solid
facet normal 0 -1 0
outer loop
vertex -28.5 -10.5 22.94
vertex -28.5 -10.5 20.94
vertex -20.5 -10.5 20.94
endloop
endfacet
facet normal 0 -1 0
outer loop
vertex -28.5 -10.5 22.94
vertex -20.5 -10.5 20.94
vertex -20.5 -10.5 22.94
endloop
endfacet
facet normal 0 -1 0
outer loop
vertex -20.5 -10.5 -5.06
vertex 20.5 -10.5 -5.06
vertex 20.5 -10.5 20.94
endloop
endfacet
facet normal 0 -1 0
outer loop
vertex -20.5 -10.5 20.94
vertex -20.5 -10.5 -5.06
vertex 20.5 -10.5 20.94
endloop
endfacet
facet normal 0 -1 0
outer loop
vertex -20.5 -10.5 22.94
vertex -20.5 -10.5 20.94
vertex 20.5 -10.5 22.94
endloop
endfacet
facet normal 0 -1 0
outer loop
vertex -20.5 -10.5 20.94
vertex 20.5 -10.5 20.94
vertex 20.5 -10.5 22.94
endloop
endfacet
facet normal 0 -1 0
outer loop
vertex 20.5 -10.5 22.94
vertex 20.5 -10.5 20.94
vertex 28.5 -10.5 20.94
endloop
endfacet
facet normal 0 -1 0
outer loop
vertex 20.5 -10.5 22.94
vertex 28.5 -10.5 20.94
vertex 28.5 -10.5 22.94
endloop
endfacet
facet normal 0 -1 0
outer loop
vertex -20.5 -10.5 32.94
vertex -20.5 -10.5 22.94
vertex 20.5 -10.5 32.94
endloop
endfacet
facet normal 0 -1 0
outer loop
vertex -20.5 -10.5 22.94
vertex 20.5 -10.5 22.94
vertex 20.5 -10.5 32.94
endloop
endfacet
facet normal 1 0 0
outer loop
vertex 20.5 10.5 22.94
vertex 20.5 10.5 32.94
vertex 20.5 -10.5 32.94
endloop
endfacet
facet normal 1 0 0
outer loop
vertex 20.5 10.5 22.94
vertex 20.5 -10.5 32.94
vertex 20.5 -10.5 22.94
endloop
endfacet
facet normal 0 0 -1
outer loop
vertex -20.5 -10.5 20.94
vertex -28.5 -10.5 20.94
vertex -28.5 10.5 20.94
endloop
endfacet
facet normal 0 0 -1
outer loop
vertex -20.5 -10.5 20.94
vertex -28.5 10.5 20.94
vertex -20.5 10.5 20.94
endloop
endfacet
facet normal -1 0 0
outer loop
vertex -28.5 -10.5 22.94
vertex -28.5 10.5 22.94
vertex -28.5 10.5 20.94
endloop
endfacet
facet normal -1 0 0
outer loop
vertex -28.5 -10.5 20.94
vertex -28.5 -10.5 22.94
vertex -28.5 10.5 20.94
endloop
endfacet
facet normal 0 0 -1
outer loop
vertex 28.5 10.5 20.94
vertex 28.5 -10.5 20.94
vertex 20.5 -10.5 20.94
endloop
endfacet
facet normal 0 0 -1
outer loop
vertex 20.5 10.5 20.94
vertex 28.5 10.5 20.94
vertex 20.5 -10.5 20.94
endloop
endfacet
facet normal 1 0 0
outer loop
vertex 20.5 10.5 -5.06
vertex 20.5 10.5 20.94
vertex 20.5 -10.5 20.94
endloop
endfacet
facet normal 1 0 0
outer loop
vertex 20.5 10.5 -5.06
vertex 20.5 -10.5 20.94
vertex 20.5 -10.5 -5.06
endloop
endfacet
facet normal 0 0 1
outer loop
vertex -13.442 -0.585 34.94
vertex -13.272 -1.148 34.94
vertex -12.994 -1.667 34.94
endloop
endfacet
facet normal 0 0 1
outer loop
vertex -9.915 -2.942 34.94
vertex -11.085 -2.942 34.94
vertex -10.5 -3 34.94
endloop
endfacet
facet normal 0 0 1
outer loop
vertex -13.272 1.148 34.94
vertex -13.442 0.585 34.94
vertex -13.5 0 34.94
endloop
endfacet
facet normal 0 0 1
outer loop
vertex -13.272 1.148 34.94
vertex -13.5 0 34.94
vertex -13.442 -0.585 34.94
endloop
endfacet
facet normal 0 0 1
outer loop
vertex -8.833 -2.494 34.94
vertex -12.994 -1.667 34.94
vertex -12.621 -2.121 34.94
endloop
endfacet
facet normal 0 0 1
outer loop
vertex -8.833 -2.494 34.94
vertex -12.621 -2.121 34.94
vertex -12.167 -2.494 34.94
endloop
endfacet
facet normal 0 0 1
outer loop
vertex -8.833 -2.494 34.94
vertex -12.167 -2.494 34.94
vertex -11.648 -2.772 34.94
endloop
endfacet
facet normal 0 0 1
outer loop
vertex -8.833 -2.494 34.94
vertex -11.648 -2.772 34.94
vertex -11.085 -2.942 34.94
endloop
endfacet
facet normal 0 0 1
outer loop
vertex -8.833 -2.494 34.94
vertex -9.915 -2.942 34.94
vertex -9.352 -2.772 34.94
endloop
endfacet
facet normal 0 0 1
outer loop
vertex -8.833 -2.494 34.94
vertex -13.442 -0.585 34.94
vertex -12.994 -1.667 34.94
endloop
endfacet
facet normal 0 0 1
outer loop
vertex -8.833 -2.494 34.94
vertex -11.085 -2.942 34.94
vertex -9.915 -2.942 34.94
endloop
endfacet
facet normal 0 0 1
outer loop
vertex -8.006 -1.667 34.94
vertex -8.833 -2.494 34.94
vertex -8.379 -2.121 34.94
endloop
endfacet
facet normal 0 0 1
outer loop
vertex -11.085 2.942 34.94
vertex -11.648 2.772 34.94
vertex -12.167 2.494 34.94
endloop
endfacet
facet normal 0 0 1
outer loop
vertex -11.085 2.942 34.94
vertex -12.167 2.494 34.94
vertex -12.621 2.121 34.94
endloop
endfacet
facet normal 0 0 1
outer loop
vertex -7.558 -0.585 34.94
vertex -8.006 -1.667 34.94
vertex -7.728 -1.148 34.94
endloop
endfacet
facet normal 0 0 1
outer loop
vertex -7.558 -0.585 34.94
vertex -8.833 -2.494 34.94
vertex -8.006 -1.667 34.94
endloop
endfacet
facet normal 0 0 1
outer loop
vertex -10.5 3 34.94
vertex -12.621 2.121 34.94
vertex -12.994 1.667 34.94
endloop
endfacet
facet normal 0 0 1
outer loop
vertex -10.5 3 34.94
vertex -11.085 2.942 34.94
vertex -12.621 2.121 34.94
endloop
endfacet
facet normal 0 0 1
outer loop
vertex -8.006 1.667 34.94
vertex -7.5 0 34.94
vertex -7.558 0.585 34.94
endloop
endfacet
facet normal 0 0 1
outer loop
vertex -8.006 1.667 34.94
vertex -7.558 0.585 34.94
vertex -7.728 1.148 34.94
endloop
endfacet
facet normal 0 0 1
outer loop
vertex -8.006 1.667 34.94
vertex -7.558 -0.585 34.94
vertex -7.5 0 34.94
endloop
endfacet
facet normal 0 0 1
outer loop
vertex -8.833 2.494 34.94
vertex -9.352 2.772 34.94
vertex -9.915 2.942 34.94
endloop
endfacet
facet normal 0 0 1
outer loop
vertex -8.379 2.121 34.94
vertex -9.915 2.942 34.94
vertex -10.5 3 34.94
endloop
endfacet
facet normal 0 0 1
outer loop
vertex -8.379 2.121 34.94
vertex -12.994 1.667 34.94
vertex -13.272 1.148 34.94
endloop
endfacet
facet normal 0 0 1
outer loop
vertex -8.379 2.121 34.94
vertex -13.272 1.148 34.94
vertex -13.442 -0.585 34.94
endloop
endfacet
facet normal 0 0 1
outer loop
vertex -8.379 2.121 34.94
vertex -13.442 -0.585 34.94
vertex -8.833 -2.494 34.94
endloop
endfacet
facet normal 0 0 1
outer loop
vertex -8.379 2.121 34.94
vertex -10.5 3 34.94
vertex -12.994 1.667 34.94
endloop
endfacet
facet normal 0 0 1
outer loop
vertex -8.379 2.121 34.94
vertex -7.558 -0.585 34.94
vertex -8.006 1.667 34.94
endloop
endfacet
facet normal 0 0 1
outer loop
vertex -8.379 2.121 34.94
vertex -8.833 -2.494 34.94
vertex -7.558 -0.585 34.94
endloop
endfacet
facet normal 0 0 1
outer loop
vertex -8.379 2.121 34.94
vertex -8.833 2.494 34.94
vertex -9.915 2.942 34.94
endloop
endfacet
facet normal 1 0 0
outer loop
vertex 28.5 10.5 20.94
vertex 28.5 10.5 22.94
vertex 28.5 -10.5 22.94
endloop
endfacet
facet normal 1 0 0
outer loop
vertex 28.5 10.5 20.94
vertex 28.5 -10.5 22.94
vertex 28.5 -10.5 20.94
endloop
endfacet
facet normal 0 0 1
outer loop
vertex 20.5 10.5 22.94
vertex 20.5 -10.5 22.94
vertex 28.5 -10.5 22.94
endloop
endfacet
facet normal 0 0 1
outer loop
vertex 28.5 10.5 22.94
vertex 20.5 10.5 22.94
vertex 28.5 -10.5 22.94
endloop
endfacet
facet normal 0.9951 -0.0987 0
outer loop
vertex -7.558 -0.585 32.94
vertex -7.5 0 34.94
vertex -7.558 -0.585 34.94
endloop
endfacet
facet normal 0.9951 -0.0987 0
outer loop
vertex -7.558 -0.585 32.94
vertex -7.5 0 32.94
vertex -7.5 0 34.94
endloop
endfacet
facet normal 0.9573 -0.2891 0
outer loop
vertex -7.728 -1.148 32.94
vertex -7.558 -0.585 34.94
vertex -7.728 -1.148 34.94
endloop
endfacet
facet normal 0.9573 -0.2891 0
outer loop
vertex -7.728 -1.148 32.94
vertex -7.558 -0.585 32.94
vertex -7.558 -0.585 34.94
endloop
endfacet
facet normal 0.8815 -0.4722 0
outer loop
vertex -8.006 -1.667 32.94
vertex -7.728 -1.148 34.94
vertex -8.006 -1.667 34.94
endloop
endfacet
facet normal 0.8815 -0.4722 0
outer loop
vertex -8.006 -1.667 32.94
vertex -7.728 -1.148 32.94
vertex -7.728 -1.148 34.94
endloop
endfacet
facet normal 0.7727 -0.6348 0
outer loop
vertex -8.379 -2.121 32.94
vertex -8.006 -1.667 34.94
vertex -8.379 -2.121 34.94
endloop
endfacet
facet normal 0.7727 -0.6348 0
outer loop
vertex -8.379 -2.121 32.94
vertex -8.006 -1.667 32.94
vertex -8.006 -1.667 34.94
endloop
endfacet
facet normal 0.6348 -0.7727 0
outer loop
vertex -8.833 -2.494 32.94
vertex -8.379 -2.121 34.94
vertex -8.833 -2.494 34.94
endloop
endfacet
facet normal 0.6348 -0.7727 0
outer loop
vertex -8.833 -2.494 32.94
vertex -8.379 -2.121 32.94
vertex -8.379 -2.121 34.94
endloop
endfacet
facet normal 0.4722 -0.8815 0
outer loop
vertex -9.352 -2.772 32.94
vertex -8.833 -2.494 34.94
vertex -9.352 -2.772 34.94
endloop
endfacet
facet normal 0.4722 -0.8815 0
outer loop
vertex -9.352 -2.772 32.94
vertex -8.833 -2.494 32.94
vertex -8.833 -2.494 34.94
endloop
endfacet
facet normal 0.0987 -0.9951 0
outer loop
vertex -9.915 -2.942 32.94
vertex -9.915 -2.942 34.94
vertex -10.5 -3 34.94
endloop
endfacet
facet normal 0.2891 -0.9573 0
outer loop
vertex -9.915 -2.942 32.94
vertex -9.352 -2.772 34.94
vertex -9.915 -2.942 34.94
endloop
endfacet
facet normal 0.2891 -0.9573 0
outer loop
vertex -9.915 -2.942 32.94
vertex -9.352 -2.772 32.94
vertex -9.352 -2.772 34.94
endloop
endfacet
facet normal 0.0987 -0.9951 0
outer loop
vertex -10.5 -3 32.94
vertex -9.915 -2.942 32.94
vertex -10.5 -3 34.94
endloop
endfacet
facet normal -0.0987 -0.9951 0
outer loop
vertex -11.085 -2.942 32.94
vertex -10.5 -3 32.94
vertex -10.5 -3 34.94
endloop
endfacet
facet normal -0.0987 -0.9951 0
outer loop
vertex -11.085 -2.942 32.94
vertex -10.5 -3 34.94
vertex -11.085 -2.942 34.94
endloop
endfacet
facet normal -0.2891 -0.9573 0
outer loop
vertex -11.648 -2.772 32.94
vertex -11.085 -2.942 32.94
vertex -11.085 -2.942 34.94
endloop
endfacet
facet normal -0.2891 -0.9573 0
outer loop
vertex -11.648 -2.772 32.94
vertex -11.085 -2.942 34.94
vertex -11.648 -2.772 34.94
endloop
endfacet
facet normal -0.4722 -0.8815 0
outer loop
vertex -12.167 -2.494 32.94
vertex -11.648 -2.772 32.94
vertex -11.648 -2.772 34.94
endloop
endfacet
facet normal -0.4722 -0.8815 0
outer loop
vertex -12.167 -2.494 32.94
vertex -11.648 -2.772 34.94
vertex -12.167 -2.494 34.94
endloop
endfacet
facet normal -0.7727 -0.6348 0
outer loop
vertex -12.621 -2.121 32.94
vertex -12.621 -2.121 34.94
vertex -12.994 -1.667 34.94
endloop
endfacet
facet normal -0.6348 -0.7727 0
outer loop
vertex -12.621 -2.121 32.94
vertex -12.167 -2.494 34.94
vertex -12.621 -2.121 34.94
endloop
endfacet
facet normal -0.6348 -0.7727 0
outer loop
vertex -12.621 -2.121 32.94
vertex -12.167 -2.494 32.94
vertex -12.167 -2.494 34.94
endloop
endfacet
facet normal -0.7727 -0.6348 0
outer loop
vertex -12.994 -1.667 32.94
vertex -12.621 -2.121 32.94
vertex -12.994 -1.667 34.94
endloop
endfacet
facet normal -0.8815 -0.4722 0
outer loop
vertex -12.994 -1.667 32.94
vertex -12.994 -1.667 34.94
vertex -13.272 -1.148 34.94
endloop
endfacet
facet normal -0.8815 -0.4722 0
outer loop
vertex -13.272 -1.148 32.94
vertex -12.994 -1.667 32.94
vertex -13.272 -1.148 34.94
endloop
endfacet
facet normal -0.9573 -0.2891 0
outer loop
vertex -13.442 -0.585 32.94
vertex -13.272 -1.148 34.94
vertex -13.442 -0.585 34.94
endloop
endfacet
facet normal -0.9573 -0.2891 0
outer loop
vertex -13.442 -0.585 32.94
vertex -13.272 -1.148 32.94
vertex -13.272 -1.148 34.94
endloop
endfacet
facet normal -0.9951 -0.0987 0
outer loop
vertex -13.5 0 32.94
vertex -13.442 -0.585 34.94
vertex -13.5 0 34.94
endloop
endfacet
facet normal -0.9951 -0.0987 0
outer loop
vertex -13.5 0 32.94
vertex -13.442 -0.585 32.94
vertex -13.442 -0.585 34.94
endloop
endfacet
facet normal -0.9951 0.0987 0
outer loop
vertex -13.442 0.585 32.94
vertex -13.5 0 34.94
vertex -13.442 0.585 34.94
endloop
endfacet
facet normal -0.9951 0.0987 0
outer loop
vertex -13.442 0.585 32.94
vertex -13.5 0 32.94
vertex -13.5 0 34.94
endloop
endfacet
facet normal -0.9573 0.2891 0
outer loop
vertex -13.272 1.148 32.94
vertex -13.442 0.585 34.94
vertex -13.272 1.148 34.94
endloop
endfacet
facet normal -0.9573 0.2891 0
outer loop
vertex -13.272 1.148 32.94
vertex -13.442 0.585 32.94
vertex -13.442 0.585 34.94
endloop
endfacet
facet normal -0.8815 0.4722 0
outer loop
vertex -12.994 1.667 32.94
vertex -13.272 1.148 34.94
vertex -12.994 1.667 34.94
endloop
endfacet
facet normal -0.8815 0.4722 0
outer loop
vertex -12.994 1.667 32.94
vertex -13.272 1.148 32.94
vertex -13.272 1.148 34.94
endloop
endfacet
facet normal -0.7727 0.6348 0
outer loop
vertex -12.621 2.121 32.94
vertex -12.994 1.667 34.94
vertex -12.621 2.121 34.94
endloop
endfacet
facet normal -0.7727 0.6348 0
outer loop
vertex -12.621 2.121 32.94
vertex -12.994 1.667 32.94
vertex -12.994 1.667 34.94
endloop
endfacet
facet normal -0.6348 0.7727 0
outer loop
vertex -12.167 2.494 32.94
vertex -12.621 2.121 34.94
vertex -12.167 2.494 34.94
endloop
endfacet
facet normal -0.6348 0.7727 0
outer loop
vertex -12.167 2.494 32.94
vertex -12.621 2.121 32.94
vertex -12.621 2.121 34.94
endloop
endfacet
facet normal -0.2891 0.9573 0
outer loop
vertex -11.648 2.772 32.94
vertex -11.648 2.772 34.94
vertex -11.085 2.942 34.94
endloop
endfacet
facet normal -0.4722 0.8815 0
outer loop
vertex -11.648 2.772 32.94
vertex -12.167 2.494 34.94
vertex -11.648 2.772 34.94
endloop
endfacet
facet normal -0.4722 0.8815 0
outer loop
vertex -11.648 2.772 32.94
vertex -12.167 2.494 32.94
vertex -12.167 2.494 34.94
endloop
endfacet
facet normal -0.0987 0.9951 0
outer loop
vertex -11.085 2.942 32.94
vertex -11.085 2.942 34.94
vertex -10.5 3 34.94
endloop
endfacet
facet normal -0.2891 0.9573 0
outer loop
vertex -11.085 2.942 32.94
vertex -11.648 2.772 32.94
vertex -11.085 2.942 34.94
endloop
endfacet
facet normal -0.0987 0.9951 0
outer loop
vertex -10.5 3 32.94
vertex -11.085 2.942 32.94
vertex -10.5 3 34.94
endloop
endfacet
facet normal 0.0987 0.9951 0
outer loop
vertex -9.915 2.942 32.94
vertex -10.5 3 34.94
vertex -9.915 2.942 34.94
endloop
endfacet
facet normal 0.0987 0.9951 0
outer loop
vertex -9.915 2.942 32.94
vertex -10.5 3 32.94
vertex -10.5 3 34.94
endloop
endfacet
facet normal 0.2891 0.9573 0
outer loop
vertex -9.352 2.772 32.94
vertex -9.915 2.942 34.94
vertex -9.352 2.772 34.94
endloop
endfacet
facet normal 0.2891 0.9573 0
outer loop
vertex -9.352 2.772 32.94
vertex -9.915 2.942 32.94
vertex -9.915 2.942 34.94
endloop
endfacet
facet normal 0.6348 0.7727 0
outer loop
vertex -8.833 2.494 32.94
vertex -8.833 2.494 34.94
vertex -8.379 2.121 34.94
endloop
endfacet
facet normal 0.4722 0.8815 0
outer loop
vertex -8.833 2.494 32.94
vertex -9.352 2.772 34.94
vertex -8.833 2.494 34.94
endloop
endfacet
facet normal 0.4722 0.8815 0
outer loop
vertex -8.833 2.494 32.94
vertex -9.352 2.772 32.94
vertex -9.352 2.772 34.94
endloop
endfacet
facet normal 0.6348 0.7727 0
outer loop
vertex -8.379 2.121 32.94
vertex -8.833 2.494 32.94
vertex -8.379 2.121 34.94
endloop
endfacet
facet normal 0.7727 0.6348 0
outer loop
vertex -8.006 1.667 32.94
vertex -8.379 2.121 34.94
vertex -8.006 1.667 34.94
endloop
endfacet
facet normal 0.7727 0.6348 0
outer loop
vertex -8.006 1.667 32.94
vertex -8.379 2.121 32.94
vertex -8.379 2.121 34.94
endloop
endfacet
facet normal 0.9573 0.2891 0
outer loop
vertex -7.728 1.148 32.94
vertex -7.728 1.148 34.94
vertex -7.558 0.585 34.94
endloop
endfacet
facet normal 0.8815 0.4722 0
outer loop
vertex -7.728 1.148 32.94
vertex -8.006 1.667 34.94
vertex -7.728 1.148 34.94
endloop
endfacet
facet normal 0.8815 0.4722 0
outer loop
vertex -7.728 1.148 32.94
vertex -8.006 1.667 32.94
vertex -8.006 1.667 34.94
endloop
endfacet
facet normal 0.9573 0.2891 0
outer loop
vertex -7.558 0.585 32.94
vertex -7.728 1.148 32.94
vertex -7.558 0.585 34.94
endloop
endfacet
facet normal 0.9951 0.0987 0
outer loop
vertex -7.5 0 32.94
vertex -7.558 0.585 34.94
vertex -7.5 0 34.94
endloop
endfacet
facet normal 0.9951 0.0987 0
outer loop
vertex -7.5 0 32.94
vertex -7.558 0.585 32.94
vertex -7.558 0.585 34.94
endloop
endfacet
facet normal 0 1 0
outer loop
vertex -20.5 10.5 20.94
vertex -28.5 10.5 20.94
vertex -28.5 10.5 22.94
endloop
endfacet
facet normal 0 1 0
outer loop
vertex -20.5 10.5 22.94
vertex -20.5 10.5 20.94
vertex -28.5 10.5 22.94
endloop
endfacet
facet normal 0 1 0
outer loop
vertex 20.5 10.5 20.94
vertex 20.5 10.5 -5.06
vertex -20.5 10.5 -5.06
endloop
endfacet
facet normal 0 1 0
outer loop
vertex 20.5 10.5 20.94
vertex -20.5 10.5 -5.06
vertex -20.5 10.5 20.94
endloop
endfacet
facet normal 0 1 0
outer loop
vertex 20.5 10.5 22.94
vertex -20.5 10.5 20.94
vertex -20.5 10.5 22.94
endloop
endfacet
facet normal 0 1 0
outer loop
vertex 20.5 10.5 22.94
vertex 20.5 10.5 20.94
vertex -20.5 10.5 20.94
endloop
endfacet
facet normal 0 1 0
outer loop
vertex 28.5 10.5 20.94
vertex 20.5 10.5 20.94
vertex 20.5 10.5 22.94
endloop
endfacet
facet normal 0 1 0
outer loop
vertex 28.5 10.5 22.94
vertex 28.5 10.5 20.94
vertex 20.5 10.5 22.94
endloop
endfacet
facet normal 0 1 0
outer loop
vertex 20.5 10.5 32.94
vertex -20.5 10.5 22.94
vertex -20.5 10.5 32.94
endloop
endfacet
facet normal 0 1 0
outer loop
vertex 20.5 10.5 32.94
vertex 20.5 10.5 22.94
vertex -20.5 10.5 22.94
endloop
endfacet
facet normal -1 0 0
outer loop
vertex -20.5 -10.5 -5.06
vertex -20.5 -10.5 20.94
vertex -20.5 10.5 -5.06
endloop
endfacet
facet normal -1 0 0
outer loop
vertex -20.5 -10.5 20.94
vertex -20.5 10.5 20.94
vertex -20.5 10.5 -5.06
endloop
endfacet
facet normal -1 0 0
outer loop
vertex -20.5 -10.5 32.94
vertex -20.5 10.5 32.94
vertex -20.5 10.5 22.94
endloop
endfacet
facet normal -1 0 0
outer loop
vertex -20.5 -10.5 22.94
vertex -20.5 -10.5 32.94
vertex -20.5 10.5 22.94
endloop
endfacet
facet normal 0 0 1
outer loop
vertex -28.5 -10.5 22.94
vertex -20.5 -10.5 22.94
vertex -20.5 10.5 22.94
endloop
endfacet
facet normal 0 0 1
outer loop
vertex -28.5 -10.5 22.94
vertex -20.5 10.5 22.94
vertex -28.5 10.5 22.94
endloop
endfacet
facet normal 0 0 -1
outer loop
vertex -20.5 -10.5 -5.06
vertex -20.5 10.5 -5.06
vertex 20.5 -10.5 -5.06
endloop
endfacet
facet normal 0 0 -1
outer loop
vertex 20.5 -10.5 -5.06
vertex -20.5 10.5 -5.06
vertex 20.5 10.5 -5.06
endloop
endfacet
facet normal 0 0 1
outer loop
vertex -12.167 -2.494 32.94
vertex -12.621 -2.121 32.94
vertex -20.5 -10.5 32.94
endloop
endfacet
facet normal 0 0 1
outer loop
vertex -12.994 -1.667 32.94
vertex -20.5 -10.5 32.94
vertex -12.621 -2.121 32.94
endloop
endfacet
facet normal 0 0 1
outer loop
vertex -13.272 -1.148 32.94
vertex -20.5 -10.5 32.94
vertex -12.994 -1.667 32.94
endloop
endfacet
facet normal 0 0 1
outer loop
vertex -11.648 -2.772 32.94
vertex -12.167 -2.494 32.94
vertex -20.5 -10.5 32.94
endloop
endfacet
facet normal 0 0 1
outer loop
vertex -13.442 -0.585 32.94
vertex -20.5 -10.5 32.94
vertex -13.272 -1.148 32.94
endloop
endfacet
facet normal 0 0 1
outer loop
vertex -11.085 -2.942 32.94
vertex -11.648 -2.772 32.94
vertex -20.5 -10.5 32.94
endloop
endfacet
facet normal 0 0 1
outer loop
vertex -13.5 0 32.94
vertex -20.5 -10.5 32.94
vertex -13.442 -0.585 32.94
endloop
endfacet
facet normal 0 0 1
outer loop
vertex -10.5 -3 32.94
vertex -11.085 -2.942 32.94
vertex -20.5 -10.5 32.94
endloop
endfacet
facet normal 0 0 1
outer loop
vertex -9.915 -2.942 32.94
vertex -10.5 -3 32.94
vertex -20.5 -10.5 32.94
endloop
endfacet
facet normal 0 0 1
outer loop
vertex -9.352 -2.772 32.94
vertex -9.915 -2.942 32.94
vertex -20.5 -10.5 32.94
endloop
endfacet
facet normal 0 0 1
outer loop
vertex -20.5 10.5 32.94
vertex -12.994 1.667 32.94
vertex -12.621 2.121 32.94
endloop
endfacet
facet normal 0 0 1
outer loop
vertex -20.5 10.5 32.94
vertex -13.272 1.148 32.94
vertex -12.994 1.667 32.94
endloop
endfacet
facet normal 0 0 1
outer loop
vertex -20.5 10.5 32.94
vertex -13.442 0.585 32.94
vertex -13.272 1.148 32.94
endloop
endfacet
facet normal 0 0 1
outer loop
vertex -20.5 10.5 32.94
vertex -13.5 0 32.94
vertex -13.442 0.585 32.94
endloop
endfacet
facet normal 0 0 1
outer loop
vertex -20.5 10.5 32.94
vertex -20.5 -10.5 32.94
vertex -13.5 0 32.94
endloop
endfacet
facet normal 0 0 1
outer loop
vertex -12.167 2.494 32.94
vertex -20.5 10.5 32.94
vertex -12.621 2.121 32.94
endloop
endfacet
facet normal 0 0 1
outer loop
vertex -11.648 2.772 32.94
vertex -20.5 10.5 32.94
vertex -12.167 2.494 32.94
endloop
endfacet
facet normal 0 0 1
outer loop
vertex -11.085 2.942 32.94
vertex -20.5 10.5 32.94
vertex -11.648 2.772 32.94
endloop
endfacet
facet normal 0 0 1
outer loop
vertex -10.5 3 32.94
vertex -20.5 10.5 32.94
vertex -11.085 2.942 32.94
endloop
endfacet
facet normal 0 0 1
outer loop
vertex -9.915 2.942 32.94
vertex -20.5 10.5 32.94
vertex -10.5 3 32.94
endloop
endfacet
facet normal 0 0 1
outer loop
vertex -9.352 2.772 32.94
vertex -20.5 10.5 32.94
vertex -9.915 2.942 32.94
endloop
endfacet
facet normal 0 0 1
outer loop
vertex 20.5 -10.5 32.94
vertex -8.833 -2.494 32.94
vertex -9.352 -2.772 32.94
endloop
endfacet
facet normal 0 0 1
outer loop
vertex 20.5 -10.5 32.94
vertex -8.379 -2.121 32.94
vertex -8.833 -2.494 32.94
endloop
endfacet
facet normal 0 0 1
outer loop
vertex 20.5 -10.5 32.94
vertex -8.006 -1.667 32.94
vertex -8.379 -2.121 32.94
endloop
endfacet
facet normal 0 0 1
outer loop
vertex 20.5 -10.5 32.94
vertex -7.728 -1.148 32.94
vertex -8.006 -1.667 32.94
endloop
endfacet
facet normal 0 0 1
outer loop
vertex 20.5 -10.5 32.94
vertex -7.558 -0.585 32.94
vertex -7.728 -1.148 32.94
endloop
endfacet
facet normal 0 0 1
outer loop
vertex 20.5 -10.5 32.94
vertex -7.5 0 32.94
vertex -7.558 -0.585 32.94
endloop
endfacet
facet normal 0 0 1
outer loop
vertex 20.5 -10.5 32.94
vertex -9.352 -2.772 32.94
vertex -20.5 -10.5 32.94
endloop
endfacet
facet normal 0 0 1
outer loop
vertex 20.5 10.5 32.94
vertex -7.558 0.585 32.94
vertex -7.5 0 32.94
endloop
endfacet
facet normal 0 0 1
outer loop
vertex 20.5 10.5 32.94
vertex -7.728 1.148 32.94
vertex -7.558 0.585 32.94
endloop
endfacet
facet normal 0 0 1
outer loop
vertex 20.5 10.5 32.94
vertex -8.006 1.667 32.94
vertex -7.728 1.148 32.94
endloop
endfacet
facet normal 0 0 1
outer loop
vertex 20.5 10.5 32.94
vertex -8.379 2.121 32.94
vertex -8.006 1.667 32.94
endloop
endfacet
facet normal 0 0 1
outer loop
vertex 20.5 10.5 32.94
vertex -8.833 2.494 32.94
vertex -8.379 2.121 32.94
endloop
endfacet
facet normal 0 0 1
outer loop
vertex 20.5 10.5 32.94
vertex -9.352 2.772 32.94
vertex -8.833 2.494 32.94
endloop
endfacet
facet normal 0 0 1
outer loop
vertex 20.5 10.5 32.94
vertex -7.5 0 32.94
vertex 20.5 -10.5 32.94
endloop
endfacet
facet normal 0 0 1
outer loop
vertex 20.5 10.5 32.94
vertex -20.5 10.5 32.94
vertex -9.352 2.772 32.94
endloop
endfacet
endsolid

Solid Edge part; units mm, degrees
sketch "Sketch1" plane through (0, 0, 0) normal (0, -1, 0) x (1, 0, 0)
  line L0 (-20.5, 32.9403) -> (20.5, 32.9403)
  line L1 (20.5, 32.9403) -> (20.5, 22.9403)
  line L2 (20.5, 22.9403) -> (28.5, 22.9403)
  line L3 (28.5, 22.9403) -> (28.5, 20.9403)
  line L4 (28.5, 20.9403) -> (20.5, 20.9403)
  line L5 (20.5, 20.9403) -> (20.5, -5.0597)
  line L6 (-20.5, -5.0597) -> (20.5, -5.0597)
  line L7 (-20.5, 20.9403) -> (-20.5, -5.0597)
  line L8 (-28.5, 20.9403) -> (-20.5, 20.9403)
  line L9 (-28.5, 22.9403) -> (-28.5, 20.9403)
  line L10 (-20.5, 22.9403) -> (-28.5, 22.9403)
  line L11 (-20.5, 32.9403) -> (-20.5, 22.9403)
  dimension "D1" = 41
  dimension "D2" = 10
  dimension "D3" = 2
  dimension "D4" = 26
  dimension "D5" = 8
extrude "Protrusion1" add sketch "Sketch1" along normal mid plane 21
sketch "Sketch2" plane through (0, 0, 32.9403) normal (0, 0, 1) x (1, 0, 0)
  circle A0 centre (-10.5, 0) radius 3
  dimension "D1" = 10
  dimension "D2" = 6
extrude "ProtrusiónExtruida_2" add sketch "Sketch2" along normal mid plane 4
